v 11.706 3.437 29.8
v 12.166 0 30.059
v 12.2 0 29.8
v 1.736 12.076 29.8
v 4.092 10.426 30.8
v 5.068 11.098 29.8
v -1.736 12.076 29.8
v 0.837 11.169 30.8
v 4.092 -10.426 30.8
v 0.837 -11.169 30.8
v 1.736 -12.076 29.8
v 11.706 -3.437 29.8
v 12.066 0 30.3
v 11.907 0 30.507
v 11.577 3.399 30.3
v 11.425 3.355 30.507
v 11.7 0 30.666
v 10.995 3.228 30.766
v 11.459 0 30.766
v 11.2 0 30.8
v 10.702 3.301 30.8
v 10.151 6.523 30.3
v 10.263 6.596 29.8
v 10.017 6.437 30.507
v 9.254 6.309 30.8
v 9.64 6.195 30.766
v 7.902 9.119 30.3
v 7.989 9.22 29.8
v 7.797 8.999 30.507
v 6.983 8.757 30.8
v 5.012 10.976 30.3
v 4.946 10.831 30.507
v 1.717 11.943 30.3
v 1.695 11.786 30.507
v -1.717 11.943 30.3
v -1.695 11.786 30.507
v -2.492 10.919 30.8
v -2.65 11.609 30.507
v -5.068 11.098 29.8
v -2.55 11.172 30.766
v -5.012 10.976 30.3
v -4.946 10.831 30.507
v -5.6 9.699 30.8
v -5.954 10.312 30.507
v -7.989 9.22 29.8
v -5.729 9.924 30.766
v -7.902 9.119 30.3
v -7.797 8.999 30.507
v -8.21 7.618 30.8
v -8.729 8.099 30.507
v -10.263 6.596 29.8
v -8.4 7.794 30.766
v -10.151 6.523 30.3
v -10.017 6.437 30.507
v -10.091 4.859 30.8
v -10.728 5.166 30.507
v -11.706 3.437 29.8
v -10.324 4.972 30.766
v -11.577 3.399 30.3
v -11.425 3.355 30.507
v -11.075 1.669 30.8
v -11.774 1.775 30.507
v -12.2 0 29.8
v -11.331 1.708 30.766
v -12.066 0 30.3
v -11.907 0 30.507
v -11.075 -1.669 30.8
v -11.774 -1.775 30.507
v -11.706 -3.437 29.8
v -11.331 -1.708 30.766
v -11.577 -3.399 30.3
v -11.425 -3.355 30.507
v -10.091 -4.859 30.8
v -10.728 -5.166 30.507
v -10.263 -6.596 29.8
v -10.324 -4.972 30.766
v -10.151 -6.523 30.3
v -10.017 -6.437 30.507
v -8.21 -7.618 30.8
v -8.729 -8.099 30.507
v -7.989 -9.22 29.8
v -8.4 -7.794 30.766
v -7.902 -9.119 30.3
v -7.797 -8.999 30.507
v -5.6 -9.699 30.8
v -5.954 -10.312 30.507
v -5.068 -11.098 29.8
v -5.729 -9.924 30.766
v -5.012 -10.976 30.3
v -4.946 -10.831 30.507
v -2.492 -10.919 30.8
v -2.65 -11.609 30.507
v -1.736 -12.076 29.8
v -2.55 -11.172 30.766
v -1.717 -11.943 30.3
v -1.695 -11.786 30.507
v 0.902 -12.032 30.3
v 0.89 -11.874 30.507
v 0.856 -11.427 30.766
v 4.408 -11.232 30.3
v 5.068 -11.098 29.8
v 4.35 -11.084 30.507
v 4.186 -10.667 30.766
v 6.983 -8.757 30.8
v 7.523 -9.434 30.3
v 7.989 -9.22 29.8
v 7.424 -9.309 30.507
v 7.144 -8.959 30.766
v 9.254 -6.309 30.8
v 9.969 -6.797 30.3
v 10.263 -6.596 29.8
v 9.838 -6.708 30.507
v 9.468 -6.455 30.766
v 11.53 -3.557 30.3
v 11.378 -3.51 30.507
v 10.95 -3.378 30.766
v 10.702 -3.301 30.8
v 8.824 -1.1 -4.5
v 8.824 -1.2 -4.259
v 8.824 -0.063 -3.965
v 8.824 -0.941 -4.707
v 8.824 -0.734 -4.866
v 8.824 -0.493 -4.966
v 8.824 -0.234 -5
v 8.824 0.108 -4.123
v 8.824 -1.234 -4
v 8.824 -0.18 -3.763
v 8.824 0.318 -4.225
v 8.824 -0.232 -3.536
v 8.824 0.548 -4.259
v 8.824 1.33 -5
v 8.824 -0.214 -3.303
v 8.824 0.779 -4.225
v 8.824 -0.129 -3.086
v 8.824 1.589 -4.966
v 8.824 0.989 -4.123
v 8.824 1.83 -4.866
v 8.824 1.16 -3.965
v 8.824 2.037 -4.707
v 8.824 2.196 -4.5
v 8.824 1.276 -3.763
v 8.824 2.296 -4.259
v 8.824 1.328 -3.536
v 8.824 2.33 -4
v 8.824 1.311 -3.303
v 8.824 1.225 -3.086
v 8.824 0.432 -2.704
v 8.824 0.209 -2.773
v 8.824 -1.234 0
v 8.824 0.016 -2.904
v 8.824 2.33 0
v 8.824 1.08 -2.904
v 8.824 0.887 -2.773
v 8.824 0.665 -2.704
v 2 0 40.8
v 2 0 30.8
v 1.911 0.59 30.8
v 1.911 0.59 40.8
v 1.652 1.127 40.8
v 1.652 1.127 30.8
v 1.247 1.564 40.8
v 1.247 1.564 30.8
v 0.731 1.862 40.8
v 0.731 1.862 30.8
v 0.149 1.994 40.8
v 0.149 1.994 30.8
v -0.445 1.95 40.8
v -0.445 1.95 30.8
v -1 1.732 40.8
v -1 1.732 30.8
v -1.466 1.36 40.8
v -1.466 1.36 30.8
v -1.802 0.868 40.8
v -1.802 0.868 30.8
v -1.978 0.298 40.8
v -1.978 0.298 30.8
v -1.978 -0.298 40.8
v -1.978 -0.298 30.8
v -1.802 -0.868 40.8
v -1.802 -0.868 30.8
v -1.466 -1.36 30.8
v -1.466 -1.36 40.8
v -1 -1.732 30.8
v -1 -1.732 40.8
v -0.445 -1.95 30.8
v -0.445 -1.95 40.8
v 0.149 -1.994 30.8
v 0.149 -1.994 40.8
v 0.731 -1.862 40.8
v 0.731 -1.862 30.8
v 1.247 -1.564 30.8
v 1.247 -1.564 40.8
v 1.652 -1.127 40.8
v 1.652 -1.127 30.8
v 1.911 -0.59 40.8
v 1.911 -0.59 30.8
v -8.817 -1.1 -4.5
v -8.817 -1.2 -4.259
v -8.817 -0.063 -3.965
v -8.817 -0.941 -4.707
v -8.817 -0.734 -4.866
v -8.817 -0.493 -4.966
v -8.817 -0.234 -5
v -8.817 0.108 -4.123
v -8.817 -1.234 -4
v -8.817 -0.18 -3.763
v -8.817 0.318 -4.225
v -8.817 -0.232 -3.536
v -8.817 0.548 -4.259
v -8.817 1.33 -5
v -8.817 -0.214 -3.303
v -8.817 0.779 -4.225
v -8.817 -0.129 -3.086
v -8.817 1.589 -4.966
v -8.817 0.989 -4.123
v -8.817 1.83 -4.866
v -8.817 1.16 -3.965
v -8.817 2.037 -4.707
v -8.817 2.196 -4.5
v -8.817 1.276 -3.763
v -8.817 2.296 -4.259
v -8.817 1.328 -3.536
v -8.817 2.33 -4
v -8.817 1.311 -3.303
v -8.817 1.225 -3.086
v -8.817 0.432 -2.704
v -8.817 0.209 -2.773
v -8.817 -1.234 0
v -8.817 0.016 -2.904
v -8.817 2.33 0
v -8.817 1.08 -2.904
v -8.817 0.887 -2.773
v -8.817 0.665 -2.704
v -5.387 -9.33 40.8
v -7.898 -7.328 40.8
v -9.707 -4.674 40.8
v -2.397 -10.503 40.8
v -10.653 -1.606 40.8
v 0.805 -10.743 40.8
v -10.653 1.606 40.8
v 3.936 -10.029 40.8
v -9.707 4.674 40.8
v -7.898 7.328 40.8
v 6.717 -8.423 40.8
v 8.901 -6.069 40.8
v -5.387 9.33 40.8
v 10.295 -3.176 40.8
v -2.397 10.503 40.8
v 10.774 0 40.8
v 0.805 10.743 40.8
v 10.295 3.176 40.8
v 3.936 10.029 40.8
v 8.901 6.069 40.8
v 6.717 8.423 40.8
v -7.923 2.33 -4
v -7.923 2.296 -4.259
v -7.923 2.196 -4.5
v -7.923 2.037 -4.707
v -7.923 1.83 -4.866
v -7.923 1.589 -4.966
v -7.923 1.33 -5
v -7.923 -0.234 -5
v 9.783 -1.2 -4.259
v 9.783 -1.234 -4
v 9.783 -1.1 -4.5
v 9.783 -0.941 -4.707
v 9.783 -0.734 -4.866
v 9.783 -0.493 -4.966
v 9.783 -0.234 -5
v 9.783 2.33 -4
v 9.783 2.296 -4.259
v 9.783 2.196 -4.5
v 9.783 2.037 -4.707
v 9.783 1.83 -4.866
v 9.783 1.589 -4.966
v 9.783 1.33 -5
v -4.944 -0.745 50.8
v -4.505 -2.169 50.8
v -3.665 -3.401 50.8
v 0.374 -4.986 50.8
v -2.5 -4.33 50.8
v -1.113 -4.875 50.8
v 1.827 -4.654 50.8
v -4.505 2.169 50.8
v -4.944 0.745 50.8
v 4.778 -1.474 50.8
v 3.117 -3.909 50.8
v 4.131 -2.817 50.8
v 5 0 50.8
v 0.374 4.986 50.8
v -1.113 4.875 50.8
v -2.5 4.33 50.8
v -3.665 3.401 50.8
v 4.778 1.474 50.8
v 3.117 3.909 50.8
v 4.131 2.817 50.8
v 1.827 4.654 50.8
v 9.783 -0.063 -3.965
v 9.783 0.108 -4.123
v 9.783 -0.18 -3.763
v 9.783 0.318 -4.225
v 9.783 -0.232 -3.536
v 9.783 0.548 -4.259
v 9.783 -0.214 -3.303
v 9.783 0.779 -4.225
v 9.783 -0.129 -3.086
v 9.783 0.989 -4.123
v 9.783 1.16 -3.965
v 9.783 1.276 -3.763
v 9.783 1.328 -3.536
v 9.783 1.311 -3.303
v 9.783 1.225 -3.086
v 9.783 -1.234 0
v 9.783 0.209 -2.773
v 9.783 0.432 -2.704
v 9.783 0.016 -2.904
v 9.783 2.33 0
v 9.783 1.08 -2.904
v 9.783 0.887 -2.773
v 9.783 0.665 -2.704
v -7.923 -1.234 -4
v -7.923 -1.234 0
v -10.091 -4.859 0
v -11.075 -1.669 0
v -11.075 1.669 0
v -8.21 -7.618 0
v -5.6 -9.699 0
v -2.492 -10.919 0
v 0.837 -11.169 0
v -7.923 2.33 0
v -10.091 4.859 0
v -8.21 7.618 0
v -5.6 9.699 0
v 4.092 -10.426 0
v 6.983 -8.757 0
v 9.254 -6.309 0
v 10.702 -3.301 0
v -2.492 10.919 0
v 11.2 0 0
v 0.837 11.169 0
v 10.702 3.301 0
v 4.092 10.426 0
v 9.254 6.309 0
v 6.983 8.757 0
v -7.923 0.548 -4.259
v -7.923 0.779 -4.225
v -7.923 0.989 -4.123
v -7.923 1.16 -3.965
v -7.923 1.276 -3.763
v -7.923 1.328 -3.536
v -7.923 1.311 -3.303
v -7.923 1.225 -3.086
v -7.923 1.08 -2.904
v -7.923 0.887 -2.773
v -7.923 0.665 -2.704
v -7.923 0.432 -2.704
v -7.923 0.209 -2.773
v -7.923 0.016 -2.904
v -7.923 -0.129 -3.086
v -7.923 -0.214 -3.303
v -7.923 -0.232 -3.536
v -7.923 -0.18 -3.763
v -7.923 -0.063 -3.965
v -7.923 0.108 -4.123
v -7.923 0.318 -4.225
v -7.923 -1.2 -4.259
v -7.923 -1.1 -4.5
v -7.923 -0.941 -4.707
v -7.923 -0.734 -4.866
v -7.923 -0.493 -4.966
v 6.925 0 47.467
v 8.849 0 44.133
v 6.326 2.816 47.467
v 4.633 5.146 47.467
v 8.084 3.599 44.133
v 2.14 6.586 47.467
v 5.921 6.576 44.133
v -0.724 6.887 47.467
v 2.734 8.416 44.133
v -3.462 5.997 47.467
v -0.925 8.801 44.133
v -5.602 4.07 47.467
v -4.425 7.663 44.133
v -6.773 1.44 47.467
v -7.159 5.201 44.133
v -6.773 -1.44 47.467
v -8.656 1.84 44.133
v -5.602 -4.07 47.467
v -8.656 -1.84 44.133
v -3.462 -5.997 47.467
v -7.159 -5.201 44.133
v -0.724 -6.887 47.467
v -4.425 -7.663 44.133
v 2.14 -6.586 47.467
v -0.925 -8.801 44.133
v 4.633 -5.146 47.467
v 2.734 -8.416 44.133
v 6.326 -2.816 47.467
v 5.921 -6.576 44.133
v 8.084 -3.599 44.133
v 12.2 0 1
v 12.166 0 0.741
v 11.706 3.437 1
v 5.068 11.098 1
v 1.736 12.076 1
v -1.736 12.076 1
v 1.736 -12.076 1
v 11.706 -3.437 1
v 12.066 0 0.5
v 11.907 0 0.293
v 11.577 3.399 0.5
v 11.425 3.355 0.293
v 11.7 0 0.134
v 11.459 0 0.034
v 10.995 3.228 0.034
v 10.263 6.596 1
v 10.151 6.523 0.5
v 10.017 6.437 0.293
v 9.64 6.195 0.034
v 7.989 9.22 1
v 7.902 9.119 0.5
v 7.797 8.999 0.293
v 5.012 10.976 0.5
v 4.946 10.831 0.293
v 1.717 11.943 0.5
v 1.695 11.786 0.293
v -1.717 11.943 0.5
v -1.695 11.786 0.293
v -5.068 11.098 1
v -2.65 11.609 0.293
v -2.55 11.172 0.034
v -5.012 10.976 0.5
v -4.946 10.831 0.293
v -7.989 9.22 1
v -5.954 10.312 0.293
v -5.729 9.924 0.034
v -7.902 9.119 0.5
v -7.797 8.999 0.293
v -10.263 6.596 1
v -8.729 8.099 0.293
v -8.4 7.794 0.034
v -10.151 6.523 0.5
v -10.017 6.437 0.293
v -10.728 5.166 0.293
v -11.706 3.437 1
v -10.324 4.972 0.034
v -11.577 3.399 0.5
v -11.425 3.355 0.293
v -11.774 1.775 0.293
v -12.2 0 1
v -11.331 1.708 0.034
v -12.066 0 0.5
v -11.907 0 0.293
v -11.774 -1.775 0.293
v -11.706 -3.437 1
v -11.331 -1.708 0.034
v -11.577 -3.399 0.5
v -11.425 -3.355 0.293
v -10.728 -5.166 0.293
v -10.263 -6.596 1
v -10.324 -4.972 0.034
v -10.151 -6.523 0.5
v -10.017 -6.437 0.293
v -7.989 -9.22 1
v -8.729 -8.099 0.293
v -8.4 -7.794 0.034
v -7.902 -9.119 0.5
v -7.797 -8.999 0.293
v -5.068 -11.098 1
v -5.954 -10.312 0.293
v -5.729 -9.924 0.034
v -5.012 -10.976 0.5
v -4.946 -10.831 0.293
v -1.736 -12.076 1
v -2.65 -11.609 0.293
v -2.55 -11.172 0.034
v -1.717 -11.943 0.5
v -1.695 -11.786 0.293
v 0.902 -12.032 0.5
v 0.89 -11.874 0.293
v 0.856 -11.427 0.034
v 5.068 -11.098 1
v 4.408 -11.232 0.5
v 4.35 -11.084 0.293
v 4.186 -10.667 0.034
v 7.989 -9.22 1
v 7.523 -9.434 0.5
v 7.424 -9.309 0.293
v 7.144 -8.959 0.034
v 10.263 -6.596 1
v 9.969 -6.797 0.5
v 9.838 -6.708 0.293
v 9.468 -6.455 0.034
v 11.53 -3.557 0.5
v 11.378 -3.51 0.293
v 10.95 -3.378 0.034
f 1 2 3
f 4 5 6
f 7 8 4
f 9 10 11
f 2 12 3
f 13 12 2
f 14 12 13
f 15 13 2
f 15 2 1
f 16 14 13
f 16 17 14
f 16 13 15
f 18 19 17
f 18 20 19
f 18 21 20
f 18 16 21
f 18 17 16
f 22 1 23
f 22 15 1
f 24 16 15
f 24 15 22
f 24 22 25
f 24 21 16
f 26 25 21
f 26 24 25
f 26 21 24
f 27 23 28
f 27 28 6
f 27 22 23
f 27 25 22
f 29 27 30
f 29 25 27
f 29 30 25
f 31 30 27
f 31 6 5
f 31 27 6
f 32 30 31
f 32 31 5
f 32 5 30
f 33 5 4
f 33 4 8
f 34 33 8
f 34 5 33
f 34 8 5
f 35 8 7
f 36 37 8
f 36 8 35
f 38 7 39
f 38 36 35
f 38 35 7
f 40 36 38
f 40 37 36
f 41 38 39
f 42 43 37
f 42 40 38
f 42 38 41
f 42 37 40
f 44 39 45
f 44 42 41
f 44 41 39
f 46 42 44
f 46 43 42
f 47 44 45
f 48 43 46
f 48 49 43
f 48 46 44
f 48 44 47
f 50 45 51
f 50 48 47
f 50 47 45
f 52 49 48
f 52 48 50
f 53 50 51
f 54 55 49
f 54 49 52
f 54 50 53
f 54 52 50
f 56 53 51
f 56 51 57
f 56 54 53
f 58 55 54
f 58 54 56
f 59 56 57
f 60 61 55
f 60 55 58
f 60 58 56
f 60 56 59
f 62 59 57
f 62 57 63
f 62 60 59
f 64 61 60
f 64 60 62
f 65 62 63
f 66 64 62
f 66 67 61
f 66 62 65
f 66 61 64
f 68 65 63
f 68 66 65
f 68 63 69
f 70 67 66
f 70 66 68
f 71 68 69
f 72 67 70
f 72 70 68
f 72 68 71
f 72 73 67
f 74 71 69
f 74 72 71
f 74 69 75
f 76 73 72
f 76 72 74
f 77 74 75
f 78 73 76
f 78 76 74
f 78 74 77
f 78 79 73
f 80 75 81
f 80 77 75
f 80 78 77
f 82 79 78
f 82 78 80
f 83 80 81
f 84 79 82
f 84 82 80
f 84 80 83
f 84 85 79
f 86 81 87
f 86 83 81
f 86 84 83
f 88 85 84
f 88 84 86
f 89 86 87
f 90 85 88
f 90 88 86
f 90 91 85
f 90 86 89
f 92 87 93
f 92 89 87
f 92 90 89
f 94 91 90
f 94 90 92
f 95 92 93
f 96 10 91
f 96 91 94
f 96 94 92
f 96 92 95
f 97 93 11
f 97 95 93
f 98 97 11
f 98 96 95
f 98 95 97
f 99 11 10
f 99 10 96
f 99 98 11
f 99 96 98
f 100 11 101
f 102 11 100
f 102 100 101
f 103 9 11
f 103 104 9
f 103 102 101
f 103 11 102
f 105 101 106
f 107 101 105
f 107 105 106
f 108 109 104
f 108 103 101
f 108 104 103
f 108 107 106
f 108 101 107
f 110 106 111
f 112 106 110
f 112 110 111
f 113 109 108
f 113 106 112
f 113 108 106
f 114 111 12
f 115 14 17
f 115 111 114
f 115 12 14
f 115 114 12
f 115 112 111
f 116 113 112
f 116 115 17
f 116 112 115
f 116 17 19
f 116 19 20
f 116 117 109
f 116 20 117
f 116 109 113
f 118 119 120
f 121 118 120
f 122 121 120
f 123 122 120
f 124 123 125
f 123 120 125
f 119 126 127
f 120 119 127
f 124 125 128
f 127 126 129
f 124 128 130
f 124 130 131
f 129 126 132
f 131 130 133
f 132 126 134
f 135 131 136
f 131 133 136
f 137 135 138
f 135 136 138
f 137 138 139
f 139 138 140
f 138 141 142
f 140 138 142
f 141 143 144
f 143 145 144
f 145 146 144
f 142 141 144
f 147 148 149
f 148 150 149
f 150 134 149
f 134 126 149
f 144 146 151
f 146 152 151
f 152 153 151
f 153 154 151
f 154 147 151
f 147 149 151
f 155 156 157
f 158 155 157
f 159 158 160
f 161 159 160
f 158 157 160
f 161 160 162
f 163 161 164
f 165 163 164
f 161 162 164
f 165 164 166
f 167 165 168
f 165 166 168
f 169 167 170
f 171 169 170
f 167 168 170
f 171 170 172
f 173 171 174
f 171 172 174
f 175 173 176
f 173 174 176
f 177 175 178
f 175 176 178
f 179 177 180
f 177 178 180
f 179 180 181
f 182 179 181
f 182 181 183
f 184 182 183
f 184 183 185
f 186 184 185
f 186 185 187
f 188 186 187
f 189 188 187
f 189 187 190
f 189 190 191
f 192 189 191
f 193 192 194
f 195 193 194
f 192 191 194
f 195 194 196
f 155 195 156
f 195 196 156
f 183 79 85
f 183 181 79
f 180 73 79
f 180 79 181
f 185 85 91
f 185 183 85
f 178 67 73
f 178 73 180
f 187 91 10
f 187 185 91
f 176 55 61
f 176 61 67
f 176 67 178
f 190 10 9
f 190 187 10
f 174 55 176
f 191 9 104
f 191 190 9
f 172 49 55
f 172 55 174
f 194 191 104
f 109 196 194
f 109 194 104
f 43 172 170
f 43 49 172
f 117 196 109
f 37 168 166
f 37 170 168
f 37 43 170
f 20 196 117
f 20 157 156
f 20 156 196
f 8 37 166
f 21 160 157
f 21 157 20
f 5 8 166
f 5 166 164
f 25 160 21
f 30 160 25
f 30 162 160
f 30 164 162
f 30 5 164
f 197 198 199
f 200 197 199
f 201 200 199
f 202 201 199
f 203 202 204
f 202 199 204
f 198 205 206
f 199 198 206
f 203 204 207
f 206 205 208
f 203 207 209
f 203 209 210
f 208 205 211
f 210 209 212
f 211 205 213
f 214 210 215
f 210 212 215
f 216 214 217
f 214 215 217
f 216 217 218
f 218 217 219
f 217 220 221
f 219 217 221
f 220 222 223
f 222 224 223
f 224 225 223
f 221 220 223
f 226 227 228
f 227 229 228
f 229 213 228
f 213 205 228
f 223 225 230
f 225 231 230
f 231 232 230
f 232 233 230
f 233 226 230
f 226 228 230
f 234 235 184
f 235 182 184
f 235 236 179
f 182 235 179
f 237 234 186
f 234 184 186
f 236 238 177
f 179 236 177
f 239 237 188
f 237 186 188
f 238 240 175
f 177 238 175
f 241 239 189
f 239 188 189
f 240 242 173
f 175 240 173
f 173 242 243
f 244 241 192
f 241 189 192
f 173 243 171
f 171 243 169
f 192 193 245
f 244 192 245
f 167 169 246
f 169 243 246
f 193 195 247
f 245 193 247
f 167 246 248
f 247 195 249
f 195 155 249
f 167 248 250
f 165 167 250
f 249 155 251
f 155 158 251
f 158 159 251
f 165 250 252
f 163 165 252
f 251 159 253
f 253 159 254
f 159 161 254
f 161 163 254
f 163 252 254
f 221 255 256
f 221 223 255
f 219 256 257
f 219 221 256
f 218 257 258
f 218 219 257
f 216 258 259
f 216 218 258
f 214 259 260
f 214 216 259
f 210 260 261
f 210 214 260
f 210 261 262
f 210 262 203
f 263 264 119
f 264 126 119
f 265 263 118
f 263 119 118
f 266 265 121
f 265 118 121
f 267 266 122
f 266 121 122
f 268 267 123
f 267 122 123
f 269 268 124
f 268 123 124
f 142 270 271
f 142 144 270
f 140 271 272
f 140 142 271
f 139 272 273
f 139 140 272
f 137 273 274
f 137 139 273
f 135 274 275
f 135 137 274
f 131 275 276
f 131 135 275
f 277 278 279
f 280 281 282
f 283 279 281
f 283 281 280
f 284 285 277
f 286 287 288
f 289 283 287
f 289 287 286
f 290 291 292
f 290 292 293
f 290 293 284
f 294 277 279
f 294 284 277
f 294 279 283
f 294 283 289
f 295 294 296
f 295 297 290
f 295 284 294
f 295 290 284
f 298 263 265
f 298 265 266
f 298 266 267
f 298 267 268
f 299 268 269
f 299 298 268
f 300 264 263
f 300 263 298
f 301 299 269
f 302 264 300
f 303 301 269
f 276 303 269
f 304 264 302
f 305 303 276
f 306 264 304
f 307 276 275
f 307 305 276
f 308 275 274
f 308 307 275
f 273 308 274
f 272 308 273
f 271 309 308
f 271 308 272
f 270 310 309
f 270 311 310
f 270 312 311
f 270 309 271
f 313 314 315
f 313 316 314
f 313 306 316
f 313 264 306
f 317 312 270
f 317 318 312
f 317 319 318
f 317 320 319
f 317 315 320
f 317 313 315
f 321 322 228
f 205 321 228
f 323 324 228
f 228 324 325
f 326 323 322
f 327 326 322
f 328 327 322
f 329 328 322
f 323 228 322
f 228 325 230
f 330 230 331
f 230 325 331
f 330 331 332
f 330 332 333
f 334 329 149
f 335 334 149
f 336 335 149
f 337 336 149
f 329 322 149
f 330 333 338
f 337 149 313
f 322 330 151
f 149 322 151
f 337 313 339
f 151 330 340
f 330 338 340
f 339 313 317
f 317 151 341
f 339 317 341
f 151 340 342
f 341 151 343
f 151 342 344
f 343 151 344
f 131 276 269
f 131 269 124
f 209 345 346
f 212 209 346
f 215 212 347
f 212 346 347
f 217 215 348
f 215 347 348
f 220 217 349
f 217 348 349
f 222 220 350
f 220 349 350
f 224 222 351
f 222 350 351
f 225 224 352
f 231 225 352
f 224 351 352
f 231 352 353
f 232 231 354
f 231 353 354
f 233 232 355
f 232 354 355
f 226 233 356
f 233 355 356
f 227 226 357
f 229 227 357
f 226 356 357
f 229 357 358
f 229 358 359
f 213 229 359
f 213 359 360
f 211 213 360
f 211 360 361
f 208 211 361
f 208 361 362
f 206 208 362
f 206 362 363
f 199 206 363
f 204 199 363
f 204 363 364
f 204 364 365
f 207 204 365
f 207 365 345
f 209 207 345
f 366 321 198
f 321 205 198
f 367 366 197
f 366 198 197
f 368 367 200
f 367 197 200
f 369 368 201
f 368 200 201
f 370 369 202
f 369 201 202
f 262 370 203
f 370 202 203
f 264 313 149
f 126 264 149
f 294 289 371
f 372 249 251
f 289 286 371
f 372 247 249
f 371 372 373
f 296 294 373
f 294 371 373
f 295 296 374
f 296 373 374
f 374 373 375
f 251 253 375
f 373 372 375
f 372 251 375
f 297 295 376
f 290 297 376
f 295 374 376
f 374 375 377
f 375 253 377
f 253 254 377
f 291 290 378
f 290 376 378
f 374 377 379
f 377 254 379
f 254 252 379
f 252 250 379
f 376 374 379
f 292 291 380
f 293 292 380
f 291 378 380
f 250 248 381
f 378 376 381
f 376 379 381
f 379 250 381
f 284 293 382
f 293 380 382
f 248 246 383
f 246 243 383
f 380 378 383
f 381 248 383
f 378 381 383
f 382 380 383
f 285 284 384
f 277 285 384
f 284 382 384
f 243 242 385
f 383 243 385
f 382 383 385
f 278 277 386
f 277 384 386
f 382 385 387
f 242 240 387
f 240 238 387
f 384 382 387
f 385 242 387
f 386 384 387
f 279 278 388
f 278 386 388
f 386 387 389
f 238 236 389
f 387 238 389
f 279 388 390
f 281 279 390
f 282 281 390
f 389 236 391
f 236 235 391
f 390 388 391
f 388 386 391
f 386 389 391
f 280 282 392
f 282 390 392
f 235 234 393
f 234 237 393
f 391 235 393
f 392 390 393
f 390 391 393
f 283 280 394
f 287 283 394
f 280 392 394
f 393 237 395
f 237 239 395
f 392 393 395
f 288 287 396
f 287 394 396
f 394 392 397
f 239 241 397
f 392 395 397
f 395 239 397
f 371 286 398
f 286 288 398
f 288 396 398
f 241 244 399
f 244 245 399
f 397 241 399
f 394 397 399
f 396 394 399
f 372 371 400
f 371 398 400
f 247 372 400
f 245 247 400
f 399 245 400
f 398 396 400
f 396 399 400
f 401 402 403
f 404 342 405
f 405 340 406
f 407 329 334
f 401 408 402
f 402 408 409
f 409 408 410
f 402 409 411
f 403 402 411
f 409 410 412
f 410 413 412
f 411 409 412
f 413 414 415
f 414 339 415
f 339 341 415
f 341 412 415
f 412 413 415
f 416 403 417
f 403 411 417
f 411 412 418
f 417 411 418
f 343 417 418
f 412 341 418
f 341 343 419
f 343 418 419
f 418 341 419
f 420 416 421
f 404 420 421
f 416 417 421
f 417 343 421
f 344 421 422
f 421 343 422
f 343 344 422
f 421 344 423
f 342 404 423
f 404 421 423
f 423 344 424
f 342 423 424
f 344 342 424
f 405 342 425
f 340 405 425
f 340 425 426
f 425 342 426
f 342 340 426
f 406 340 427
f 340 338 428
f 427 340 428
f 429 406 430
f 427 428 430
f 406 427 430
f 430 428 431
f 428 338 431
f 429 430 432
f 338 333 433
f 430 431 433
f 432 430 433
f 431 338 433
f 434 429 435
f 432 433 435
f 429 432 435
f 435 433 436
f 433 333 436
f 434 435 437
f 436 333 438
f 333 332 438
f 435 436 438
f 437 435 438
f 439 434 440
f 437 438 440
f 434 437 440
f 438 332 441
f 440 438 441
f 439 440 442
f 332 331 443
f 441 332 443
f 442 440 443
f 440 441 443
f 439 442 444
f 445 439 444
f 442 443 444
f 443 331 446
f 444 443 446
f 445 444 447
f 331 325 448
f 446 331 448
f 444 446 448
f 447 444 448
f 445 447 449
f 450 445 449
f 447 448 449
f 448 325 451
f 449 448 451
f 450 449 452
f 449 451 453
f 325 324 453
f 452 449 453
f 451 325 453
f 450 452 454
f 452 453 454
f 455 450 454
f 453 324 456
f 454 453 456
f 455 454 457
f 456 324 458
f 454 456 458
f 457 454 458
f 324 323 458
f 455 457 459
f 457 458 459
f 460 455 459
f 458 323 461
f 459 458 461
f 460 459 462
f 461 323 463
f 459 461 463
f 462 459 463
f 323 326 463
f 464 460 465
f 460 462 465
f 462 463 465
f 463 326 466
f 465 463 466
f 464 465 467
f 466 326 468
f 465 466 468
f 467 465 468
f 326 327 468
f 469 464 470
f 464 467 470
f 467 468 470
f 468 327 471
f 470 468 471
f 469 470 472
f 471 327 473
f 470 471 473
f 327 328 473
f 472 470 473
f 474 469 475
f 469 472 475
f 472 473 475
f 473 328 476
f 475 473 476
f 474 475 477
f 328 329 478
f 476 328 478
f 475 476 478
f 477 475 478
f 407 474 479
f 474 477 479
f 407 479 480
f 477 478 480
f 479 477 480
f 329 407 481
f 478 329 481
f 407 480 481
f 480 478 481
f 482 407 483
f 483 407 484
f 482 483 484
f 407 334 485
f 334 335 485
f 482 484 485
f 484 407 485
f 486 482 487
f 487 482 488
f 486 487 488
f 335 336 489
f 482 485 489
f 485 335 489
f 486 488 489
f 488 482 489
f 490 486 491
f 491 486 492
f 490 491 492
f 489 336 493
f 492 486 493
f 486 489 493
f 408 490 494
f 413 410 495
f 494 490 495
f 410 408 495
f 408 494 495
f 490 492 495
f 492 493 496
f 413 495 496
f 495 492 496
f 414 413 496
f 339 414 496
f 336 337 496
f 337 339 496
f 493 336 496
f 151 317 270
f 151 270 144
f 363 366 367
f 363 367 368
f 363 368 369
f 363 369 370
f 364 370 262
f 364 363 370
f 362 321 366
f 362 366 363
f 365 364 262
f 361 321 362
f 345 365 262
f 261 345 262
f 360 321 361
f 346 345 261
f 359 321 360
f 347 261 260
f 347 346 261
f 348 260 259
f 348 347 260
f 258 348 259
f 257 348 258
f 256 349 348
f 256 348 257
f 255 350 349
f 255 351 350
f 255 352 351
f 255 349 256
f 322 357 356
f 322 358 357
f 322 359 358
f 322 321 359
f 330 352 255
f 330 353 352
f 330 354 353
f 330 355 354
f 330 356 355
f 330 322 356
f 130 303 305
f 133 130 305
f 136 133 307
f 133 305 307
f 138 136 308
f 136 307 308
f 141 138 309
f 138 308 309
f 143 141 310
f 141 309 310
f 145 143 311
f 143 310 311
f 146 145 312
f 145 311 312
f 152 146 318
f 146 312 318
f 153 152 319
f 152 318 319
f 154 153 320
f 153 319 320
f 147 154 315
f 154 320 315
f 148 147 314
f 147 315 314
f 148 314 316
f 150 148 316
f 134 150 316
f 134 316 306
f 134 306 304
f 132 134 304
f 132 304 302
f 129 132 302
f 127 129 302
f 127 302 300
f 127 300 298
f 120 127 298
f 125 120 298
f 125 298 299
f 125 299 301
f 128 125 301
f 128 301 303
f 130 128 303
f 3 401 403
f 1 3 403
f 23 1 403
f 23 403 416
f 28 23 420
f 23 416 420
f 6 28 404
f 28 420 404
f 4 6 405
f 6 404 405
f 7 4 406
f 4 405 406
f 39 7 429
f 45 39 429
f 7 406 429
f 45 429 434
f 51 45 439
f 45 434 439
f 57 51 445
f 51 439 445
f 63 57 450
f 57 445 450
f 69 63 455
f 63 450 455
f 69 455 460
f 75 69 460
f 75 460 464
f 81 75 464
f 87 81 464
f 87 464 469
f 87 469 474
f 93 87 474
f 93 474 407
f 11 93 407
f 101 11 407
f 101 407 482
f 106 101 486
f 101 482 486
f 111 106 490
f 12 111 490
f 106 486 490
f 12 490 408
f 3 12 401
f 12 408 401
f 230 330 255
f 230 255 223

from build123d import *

# Parameters (mm, degrees)
ESBO_O1_R                = 12.2
RESSALTO_EXTRUS_O1_DEPTH = 30.8
FILETE1_R                = 1
ESBO_O2_R                = 2
RESSALTO_EXTRUS_O2_DEPTH = 10
ESBO_O4_W                = 0.958903526
ESBO_O4_H                = 3.564219336
ESBO_O4_W_2              = 0.894406544
RESSALTO_EXTRUS_O3_DEPTH = 5
FILETE2_R                = 1
ESBO_O5_R                = 0.782109668
CORTE_EXTRUS_O2_DEPTH    = 22.982815538
ESBO_O6_R                = 5
RESSALTO_EXTRUS_O5_DEPTH = 10
INCLINA_O3_ANGLE         = 30


with BuildPart() as part:
    # Esboço1 → Ressalto-extrusão1 (new body)
    with BuildSketch(Plane.XY):
        Circle(ESBO_O1_R)
    extrude(amount=RESSALTO_EXTRUS_O1_DEPTH)

    # Filete1
    filete1_edges = [part.edges().sort_by_distance(p)[0] for p in [
        (-12.2, 0, 0),
        (-12.2, 0, 30.8),
    ]]
    fillet(filete1_edges, radius=FILETE1_R)

    # Esboço2 → Ressalto-extrusão2 (add)
    with BuildSketch(Plane.XY.offset(30.8)):
        Circle(ESBO_O2_R)
    extrude(amount=RESSALTO_EXTRUS_O2_DEPTH)

    # Esboço4 → Ressalto-extrusão3 (add)
    with BuildSketch(Plane(origin=(0, 0, 0), x_dir=(-1, 0, 0), z_dir=(0, 0, -1))):
        with Locations((-9.303363775, 0.548104497)):
            Rectangle(ESBO_O4_W, ESBO_O4_H)
        with Locations((8.369776419, 0.548104497)):
            Rectangle(ESBO_O4_W_2, ESBO_O4_H)
    extrude(amount=RESSALTO_EXTRUS_O3_DEPTH)

    # Filete2
    filete2_edges = [part.edges().sort_by_distance(p)[0] for p in [
        (9.303363775, -1.234005171, -5),
        (9.303363775, 2.330214165, -5),
        (-8.369776419, 2.330214165, -5),
        (-8.369776419, -1.234005171, -5),
    ]]
    fillet(filete2_edges, radius=FILETE2_R)

    # Esboço5 → Corte-extrusão2 (cut, through all)
    with BuildSketch(Plane(origin=(9.782815538, 0, 0), x_dir=(0, 0, -1), z_dir=(1, 0, 0))):
        with Locations((3.47716986, 0.548104497)):
            Circle(ESBO_O5_R)
    extrude(amount=-CORTE_EXTRUS_O2_DEPTH, mode=Mode.SUBTRACT)

    # Esboço6 → Ressalto-extrusão5 (add)
    with BuildSketch(Plane.XY.offset(40.8)):
        Circle(ESBO_O6_R)
    extrude(amount=RESSALTO_EXTRUS_O5_DEPTH)

    # Inclinação3
    inclina_o3_faces = [part.faces().sort_by_distance(p)[0] for p in [
        (-5, 0, 45.8),
    ]]
    draft(inclina_o3_faces, Plane.XY.offset(50.8), INCLINA_O3_ANGLE)


solid = part.part
